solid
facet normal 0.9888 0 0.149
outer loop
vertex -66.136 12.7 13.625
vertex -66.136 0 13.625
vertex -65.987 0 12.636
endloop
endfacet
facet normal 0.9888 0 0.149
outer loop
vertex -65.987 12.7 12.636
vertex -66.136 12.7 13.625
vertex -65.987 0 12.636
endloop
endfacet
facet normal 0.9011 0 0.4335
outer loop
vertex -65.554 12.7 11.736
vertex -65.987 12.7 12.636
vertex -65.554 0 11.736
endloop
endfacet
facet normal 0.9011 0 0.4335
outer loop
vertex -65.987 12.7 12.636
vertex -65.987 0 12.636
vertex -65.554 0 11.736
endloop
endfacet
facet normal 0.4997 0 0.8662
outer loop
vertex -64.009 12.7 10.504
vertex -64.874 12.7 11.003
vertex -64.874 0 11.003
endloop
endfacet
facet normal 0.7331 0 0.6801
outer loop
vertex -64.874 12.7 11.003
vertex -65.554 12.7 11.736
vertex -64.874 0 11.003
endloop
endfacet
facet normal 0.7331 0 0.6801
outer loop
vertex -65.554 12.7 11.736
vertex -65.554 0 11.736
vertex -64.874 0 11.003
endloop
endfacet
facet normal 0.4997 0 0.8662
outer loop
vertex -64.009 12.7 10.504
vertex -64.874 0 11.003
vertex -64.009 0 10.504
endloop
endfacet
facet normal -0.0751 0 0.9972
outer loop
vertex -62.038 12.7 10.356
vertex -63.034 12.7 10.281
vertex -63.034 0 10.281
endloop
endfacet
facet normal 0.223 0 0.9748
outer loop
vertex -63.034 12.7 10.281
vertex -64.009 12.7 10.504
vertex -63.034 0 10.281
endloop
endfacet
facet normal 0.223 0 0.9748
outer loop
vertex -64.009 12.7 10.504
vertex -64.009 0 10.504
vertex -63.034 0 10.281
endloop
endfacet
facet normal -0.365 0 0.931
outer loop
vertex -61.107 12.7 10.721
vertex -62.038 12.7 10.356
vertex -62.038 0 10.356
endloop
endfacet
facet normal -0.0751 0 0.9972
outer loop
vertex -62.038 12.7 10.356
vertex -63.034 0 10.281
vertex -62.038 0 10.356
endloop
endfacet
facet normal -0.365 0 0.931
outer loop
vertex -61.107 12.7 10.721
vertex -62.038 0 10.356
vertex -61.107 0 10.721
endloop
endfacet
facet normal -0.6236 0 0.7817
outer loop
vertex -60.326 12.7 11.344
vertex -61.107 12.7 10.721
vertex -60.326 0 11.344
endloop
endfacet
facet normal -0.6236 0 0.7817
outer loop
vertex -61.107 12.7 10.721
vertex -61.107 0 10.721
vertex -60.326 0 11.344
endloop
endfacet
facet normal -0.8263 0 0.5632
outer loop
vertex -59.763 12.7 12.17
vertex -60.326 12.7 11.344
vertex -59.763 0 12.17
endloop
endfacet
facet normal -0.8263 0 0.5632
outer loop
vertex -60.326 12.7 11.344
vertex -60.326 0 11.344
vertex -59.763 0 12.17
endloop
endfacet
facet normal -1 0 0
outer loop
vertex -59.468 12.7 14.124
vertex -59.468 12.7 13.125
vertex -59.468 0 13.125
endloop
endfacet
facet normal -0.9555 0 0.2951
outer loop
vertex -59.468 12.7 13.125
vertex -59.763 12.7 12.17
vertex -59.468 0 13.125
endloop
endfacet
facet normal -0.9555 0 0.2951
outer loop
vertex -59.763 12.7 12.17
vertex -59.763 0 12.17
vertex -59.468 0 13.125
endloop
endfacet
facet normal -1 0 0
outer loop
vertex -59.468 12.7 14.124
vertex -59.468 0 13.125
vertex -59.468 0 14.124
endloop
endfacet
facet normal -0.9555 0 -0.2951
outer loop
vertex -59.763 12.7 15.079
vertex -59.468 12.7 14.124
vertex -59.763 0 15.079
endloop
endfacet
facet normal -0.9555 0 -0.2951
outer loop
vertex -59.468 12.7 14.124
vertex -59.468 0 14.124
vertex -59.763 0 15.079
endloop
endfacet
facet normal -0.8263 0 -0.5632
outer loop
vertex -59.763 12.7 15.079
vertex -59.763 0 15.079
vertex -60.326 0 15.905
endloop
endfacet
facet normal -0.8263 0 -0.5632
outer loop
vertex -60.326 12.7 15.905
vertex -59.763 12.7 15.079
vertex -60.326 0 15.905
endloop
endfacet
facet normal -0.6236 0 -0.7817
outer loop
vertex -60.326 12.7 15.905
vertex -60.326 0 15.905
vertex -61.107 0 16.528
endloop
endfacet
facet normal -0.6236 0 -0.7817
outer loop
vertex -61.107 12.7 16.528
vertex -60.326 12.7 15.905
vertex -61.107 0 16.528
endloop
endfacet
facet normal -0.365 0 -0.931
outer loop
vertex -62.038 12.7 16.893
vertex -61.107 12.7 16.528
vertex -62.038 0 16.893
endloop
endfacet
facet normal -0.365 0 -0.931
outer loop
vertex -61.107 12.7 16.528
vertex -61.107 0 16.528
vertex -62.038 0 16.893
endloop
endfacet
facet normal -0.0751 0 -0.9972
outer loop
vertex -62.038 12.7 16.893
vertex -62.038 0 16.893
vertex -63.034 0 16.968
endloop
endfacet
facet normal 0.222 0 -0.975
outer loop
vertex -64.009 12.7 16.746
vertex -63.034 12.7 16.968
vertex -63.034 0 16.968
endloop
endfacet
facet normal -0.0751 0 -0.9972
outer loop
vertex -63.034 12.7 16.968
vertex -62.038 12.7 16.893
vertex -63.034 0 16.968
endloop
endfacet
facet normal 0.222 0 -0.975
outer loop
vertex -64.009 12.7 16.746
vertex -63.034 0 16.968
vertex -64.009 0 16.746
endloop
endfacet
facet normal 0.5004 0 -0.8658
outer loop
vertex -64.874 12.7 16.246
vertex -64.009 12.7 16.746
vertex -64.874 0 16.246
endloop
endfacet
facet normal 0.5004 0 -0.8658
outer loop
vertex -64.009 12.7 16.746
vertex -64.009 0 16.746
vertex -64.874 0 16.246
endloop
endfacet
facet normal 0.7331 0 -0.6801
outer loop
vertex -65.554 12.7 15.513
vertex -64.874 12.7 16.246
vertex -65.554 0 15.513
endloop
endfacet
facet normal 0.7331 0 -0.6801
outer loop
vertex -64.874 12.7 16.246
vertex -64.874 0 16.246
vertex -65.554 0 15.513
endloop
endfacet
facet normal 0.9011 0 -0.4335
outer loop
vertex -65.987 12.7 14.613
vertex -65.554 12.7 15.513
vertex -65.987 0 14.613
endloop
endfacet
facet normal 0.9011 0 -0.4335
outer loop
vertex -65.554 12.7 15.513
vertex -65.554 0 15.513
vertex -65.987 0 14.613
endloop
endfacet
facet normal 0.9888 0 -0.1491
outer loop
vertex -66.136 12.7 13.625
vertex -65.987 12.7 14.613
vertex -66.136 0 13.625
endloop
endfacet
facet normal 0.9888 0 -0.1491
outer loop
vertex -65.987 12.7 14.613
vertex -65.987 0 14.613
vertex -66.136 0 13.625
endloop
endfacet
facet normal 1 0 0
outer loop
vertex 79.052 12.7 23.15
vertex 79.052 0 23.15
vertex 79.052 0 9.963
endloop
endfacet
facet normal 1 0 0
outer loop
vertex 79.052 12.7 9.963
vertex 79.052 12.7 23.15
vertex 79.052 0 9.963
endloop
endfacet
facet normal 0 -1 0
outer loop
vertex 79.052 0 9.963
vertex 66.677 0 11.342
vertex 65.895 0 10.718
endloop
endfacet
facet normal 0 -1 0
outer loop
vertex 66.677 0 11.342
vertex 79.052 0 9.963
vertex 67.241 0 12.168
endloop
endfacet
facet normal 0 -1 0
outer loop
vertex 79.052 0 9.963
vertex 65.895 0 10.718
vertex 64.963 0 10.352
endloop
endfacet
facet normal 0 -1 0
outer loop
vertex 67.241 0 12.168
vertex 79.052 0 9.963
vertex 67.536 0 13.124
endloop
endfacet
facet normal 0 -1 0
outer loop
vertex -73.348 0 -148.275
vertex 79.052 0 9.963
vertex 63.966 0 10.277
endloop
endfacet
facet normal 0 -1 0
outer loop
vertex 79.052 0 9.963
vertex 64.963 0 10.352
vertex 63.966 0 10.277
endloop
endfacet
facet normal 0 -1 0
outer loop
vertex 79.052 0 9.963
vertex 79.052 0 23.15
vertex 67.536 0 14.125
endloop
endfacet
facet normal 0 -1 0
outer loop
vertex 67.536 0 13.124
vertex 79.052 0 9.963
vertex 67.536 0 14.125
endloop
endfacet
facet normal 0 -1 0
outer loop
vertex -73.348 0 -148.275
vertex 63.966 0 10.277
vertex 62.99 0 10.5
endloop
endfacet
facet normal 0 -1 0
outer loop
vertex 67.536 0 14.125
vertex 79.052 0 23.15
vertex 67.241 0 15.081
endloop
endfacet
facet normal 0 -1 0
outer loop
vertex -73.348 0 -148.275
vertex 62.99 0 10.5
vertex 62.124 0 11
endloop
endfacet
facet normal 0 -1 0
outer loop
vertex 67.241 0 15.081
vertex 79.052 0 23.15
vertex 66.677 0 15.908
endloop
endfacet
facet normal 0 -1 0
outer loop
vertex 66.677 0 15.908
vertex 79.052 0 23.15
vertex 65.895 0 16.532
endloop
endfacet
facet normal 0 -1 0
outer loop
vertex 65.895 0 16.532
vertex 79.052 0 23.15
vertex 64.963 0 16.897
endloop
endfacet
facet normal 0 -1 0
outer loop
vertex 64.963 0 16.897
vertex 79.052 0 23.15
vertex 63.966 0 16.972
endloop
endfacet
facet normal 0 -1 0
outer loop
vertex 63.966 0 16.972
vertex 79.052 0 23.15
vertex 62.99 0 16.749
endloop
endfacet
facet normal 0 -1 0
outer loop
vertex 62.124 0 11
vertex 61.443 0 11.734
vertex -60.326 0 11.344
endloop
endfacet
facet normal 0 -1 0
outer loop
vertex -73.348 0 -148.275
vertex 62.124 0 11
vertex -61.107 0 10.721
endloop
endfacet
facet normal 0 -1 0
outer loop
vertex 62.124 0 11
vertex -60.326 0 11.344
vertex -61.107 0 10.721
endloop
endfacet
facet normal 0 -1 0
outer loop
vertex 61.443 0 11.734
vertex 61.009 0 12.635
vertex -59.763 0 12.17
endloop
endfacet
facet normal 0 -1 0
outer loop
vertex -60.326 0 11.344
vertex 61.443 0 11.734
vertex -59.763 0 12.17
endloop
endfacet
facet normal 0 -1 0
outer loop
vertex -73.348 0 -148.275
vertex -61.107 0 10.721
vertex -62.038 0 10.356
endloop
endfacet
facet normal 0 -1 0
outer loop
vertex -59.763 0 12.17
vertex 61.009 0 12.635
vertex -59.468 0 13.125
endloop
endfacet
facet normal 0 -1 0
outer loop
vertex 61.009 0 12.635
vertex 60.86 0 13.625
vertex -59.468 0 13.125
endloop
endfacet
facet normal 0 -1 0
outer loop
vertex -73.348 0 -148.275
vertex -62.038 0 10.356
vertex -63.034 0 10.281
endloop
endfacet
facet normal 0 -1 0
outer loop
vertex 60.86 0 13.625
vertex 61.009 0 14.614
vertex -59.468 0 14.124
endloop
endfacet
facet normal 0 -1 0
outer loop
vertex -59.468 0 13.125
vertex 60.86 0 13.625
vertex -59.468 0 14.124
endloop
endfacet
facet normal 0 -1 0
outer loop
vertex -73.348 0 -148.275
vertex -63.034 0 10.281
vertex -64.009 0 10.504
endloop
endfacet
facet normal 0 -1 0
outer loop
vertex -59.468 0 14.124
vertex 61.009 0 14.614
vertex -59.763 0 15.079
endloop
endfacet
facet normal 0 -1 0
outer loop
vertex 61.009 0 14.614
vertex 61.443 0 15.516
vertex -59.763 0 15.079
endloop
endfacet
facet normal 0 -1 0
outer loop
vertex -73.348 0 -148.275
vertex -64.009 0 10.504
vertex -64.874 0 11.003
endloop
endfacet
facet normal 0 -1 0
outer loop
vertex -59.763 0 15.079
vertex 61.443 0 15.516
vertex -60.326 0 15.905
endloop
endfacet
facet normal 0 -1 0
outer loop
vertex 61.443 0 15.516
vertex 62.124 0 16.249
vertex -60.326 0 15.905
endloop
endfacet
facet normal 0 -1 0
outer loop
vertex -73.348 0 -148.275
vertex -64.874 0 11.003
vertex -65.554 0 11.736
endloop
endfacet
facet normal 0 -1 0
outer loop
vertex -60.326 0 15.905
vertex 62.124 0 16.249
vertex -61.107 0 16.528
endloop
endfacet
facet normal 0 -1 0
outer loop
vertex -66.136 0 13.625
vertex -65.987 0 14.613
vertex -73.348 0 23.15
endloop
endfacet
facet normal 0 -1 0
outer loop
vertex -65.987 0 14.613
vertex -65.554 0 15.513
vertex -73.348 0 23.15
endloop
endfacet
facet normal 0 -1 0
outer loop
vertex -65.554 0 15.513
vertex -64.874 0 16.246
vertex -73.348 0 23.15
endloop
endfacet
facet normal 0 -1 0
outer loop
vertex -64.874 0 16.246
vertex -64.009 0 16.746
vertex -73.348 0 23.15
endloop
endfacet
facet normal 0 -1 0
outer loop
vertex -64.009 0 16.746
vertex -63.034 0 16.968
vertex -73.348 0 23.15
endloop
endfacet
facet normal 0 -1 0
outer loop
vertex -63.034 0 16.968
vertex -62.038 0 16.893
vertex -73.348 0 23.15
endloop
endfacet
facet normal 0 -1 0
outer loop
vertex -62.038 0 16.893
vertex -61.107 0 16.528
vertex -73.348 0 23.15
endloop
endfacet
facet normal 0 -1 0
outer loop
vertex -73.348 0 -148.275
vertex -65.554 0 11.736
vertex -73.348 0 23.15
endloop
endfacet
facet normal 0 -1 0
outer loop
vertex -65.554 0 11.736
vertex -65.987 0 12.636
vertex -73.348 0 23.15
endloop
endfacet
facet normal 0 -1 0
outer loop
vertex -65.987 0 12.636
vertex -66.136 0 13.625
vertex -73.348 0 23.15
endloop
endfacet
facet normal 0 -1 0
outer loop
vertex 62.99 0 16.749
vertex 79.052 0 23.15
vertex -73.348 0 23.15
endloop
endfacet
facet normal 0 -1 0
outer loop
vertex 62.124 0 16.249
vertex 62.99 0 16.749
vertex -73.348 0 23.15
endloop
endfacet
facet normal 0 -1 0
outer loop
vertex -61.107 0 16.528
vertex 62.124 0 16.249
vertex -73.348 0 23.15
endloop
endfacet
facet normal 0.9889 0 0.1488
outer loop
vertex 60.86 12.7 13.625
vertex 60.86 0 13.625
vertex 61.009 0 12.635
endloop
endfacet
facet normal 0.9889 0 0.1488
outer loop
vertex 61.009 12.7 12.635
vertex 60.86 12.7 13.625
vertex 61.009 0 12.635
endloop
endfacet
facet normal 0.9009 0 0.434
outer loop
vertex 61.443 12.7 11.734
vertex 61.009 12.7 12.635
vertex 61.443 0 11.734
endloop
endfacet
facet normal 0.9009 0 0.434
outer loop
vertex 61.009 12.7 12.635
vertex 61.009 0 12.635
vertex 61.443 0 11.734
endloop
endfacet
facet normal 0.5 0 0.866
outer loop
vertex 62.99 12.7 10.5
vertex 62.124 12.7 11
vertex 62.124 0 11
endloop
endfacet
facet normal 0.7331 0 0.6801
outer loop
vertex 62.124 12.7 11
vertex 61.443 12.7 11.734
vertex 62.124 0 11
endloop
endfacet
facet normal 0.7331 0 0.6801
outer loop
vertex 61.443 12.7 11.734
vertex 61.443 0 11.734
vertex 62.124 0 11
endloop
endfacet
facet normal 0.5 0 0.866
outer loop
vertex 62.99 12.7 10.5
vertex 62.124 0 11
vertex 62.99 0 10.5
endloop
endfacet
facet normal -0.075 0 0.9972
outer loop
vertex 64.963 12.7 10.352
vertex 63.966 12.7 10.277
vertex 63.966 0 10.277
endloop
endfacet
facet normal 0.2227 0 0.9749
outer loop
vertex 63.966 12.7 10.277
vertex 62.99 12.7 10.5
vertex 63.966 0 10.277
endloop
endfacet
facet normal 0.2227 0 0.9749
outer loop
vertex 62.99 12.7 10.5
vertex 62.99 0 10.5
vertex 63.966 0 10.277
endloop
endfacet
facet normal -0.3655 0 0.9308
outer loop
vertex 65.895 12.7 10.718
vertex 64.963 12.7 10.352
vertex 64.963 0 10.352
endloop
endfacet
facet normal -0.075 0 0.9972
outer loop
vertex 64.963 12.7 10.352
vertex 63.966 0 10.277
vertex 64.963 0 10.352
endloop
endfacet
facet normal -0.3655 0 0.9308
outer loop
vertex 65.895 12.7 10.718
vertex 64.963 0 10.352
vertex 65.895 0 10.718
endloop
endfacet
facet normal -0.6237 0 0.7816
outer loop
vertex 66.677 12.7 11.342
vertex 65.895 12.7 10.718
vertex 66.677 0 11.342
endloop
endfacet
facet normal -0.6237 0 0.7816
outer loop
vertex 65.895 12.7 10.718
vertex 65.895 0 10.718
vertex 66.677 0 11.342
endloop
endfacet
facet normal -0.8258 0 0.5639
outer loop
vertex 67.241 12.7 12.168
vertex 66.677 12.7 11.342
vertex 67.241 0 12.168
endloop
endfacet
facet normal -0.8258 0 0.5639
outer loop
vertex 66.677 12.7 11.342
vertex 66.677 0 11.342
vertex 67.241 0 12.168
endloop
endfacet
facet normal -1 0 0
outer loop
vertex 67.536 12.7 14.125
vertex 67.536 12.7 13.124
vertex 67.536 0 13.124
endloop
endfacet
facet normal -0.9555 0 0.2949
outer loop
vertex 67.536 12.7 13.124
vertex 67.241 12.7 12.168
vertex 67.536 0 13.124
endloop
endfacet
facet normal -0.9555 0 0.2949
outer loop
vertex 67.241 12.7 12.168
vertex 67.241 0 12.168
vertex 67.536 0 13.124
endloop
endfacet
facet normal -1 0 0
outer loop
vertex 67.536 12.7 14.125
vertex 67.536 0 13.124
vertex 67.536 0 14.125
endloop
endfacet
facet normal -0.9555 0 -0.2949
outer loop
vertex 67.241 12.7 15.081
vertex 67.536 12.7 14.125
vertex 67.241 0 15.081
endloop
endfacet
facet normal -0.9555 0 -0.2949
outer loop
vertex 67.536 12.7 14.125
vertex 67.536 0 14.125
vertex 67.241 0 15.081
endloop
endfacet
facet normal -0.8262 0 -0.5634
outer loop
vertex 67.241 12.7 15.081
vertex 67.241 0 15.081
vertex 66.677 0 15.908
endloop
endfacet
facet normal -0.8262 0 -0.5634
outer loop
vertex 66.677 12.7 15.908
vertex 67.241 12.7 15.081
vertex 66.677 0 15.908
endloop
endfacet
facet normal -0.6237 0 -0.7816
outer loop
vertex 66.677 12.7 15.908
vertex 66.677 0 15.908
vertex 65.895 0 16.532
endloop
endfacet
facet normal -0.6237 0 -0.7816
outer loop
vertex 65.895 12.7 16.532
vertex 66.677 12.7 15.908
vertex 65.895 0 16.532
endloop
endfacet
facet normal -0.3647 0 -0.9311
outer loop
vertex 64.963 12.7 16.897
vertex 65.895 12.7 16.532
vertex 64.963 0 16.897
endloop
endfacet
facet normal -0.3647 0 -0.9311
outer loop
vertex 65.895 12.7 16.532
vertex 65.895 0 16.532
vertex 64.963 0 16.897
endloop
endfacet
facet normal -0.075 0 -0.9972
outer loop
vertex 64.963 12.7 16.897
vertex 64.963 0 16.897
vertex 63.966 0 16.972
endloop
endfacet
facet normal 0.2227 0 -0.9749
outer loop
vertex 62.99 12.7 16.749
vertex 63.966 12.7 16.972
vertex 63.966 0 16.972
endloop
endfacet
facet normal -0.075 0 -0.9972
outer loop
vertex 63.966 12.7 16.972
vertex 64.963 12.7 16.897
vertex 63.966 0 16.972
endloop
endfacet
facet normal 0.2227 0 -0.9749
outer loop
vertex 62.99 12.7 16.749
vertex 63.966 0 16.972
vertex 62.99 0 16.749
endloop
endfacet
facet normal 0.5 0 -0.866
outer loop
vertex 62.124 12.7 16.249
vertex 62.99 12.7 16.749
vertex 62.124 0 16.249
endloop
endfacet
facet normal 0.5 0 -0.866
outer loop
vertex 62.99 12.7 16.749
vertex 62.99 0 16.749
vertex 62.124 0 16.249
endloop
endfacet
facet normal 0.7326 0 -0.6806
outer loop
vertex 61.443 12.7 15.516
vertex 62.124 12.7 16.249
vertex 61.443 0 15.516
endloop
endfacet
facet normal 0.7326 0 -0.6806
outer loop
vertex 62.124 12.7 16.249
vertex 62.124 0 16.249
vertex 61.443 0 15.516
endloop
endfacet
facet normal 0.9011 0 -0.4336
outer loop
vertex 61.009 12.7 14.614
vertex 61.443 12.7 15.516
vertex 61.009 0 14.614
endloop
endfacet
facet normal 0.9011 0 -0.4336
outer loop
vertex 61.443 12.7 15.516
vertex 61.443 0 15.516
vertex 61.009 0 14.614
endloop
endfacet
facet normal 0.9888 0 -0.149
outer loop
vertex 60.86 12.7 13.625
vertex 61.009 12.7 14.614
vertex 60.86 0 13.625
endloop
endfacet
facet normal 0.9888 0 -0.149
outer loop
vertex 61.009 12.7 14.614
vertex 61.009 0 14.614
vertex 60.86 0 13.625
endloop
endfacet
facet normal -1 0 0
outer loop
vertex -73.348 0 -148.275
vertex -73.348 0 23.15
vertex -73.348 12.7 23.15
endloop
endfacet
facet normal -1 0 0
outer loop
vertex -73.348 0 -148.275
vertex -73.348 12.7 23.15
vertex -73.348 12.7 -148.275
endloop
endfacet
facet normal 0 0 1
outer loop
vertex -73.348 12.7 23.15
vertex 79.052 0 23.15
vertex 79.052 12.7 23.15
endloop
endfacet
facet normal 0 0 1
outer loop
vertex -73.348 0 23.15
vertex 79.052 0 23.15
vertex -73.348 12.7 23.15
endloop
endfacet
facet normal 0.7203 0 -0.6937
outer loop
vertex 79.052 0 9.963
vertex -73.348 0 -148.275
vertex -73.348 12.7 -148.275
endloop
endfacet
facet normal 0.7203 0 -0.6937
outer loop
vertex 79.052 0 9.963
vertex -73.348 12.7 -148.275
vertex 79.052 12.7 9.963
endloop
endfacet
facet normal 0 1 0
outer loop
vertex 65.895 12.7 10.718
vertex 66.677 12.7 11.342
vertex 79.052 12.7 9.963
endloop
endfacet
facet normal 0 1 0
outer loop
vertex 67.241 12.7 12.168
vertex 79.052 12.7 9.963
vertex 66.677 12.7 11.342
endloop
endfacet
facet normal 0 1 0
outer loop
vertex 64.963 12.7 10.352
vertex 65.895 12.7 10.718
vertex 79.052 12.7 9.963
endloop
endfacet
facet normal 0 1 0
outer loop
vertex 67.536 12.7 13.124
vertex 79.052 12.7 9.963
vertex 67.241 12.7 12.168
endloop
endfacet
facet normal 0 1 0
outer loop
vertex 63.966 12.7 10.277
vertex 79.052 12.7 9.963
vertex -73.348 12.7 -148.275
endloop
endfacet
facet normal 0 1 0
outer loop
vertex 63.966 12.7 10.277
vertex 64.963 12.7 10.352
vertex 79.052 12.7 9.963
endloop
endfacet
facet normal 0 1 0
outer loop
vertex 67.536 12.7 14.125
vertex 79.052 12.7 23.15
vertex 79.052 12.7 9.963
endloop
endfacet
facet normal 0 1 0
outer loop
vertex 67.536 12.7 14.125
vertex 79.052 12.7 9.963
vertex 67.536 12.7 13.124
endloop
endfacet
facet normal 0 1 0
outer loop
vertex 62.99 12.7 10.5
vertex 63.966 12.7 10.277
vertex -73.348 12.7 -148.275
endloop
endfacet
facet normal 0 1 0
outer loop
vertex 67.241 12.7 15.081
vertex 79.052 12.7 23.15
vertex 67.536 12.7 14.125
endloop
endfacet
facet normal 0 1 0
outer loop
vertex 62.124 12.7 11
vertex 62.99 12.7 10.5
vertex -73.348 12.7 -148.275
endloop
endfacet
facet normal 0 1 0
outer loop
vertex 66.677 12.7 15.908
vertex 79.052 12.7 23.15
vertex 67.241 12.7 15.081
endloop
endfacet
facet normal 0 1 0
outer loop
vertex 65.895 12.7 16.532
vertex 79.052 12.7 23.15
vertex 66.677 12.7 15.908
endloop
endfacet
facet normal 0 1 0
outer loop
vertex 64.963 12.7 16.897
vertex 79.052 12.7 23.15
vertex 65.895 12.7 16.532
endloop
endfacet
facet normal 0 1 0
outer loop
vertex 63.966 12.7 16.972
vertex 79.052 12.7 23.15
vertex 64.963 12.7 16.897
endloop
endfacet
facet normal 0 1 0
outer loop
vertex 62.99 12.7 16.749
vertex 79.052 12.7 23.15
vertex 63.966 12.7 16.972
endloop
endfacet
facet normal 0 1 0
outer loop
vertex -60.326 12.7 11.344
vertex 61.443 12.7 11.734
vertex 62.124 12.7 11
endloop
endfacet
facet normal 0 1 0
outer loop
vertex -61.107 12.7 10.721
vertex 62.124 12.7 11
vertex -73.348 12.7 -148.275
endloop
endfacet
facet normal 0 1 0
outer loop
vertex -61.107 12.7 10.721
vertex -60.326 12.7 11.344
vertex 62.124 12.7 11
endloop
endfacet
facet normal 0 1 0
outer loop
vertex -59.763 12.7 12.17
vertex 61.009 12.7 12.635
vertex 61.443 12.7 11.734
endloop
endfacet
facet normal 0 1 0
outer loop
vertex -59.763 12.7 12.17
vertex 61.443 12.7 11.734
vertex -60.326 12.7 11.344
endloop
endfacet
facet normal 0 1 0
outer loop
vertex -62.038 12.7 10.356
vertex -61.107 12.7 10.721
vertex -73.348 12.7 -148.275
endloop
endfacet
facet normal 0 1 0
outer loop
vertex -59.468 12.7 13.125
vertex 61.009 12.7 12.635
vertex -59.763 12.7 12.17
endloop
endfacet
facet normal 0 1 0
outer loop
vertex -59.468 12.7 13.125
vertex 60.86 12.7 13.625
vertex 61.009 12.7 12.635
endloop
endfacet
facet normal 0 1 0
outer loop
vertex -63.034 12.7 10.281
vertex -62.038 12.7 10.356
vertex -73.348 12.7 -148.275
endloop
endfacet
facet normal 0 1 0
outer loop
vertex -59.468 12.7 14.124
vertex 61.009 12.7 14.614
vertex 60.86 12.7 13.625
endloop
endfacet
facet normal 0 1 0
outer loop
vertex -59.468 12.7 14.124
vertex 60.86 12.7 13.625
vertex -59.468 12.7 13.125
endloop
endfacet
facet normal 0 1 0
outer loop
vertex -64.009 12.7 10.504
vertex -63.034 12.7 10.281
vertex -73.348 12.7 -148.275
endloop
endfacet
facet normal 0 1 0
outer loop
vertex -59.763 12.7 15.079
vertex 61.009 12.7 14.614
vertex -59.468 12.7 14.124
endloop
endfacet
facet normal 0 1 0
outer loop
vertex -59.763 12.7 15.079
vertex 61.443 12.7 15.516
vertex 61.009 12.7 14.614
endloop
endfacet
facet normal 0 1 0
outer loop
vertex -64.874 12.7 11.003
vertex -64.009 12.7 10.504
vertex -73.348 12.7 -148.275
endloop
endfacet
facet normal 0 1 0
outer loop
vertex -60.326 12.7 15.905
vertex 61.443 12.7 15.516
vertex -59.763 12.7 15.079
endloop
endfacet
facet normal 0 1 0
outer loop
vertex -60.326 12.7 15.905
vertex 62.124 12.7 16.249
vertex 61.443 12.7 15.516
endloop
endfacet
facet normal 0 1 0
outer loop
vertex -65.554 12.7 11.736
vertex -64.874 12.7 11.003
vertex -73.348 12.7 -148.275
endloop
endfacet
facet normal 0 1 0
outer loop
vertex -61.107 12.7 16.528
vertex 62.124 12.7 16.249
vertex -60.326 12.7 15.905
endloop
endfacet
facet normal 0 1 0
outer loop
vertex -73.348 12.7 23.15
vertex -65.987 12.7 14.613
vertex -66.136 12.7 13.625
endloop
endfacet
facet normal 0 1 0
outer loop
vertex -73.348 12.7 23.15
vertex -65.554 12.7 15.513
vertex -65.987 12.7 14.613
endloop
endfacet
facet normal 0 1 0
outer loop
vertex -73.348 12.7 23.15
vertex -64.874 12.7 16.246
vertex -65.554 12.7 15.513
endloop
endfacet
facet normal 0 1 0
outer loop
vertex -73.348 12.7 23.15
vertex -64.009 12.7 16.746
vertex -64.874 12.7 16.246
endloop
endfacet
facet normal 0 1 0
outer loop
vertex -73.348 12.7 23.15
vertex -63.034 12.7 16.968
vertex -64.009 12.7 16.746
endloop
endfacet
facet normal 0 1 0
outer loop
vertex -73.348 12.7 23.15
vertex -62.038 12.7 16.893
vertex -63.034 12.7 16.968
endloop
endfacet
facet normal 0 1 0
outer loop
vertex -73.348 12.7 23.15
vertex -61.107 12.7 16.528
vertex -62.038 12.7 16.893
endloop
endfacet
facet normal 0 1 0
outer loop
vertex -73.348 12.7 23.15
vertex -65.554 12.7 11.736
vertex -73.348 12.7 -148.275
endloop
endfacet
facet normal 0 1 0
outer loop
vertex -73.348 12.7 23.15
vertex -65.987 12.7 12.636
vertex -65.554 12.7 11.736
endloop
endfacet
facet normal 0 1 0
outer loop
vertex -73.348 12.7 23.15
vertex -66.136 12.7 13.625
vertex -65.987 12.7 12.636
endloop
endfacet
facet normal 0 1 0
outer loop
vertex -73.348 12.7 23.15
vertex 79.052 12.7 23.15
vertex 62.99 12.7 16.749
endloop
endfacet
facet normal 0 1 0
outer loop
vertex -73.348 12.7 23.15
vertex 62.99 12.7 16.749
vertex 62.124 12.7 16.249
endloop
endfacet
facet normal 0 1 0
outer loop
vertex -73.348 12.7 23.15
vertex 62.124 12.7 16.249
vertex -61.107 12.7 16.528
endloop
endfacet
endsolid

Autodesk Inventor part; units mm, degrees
ref_plane "YZ Plane" through (0, 0, 0) normal (1, 0, 0) x (0, 1, 0)
ref_plane "XZ Plane" through (0, 0, 0) normal (0, 1, 0) x (-1, 0, 0)
ref_plane "XY Plane" through (0, 0, 0) normal (0, 0, 1) x (1, 0, 0)
sketch "Sketch1" plane through (0, 0, 0) normal (0, 1, 0) x (-1, 0, 0)
  line L0 (-91.7523, 23.1497) -> (73.3477, 23.1497)
  line L1 (73.3477, 23.1497) -> (73.3477, -148.2749)
  line L2 (73.3477, -148.2749) -> (-91.7523, 23.1497)
  circle A0 centre (62.7836, 13.6247) radius 3.3528
  circle A1 centre (-64.2164, 13.6247) radius 3.3566
  line L3 (-79.0523, 23.1497) -> (-79.0523, 9.9632)
  point P0 (0, 0)
  dimension "d0" = 165.1
  dimension "d1" = 171.4246
  dimension "d2" = 6.7056
  dimension "d3" = 9.525
  dimension "d4" = 6.7132
  dimension "d5" = 127
  dimension "d8" = 12.7
extrude "Extrusion1" add sketch "Sketch1" along normal blind 12.7 contours L0 L1 L2 L3
properties part number "BallGuidePly"
